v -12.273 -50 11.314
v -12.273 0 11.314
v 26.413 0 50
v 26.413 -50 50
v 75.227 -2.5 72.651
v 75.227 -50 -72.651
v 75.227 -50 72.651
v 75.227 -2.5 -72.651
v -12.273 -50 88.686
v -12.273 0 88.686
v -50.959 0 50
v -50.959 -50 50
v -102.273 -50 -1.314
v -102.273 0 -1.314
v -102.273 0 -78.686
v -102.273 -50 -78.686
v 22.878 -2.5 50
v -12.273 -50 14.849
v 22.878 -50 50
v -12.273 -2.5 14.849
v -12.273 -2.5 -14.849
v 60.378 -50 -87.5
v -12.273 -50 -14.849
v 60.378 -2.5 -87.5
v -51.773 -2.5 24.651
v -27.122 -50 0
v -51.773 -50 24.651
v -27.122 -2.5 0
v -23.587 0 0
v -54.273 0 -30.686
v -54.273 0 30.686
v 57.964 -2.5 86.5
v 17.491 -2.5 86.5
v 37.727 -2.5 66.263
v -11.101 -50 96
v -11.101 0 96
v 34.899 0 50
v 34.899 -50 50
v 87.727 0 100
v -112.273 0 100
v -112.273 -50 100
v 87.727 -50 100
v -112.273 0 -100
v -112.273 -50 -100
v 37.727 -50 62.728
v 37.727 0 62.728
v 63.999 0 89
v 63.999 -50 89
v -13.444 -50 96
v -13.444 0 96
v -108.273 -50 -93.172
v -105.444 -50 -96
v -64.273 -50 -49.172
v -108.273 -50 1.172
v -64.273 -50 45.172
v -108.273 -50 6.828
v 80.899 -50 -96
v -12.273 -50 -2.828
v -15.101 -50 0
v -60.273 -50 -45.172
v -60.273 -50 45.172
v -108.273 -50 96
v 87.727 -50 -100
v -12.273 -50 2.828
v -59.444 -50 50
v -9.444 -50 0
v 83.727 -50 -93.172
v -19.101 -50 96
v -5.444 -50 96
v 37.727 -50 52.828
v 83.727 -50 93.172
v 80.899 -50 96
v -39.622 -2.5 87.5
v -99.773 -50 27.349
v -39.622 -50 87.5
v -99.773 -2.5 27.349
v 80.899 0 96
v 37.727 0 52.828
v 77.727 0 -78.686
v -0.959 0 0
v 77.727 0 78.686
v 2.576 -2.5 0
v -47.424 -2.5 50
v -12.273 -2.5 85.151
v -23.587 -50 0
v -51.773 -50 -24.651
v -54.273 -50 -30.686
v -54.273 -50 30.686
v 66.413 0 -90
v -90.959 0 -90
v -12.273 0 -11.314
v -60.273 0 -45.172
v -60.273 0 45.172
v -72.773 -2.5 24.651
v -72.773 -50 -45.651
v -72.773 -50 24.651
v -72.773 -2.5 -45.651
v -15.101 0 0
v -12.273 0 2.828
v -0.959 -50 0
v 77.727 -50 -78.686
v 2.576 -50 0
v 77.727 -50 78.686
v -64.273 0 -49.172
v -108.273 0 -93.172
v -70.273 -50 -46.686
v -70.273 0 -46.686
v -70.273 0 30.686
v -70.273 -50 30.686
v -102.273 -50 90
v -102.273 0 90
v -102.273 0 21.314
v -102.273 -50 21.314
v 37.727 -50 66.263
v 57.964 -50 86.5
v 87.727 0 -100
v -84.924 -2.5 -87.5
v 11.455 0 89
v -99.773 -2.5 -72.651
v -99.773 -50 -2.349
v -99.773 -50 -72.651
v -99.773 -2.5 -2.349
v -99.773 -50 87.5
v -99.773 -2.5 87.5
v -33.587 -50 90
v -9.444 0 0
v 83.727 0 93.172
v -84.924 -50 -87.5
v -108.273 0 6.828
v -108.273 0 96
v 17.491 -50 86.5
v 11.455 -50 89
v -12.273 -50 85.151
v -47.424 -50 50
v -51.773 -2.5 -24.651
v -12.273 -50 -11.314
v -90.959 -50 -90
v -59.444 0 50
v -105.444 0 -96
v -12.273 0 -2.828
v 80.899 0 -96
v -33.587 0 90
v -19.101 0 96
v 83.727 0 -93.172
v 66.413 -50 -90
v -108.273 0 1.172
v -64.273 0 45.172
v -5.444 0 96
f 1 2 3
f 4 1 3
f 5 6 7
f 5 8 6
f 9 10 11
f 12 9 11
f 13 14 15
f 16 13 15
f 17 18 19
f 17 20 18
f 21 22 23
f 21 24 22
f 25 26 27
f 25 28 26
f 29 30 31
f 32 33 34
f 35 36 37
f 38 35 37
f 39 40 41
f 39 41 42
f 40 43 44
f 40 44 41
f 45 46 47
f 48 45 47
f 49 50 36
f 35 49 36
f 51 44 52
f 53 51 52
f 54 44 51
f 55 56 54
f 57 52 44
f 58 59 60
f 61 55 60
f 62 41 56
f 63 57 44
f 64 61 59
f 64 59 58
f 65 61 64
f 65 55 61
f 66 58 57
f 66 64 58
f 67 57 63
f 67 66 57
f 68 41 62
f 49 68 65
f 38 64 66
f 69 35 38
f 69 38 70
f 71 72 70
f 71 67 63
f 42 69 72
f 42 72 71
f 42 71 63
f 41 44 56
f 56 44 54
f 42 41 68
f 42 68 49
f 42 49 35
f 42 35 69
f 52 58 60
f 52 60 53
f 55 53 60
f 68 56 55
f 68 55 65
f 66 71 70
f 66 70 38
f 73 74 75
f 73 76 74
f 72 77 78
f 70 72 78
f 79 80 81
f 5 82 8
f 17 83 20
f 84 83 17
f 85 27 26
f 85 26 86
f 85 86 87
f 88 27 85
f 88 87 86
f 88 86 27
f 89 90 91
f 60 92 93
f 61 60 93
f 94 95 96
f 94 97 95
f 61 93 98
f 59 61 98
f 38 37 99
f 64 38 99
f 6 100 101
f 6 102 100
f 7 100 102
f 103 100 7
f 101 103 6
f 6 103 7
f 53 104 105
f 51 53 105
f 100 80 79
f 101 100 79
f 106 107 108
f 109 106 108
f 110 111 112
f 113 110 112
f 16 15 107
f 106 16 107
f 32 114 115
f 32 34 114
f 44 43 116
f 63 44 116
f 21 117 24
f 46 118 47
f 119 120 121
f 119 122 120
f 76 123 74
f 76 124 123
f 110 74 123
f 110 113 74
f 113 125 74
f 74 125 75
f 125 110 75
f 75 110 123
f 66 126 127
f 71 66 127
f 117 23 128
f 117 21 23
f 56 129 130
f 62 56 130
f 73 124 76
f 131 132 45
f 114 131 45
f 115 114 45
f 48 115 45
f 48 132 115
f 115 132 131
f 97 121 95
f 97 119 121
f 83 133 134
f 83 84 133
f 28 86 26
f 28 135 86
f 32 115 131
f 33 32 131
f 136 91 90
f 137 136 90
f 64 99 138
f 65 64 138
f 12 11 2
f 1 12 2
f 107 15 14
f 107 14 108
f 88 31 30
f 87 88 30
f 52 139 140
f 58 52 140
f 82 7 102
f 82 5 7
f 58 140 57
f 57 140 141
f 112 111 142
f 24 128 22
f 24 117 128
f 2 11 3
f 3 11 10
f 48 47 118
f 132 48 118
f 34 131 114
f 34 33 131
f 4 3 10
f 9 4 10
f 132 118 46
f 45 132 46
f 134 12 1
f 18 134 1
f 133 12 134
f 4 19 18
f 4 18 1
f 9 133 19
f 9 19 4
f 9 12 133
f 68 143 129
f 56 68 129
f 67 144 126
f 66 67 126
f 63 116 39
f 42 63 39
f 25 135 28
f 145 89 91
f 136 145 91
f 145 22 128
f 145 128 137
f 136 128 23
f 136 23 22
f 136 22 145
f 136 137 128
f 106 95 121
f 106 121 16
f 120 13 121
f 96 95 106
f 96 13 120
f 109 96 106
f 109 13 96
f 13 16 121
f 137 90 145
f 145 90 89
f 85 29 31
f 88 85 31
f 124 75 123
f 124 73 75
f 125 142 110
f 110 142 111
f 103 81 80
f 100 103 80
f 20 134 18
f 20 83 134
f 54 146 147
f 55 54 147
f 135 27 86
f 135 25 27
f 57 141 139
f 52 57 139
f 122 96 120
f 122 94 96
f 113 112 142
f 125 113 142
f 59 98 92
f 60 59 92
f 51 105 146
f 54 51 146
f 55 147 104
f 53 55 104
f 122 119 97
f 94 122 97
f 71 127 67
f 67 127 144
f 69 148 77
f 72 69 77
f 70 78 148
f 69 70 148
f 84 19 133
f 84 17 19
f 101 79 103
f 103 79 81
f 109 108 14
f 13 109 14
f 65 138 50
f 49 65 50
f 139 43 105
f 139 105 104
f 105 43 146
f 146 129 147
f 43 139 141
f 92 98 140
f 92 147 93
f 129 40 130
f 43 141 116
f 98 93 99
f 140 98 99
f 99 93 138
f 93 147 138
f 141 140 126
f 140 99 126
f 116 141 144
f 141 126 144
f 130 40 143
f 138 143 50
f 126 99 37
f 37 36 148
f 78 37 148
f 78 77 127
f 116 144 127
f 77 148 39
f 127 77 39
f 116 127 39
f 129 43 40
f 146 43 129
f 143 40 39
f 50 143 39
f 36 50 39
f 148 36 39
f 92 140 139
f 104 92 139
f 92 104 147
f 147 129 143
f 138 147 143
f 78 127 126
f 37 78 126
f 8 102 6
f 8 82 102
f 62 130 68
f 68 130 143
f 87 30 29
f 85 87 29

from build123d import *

# Parameters (mm, degrees)
F0_W     = 200
F0_H     = 200
F1_DEPTH = 50
F3_DEPTH = 50
F4_T     = -2.5
F4_2_T   = -2.5
F4_3_T   = -2.5
F4_4_T   = -2.5
F4_5_T   = -2.5
F4_6_T   = -2.5
F4_7_T   = -2.5


with BuildPart() as f1:
    # F0 (on Front) → F1 (new body)
    with BuildSketch(Plane.XZ):
        with Locations((-12.2728385031, 0)):
            Rectangle(F0_W, F0_H)
        Polygon((-64.2728385031, -49.1715728753), (-108.2728385031, -93.1715728753), (-108.2728385031, 1.1715728753), (-64.2728385031, 45.1715728753), align=None, mode=Mode.SUBTRACT)
        Polygon((-60.2728385031, -45.1715728753), (-60.2728385031, 45.1715728753), (-15.1012656279, 0), align=None, mode=Mode.SUBTRACT)
        Polygon((-12.2728385031, -2.8284271247), (80.8987343721, -96), (-105.4444113784, -96), align=None, mode=Mode.SUBTRACT)
        Polygon((-108.2728385031, 96), (-19.1012656279, 96), (-108.2728385031, 6.8284271247), align=None, mode=Mode.SUBTRACT)
        Polygon((83.7271614969, 93.1715728753), (83.7271614969, -93.1715728753), (-9.4444113784, 0), align=None, mode=Mode.SUBTRACT)
        Polygon((-59.4444113784, 50), (-13.4444113784, 96), (-11.1012656279, 96), (34.8987343721, 50), (-12.2728385031, 2.8284271247), align=None, mode=Mode.SUBTRACT)
        Polygon((-5.4444113784, 96), (80.8987343721, 96), (37.7271614969, 52.8284271247), align=None, mode=Mode.SUBTRACT)
    extrude(amount=F1_DEPTH)


with BuildPart() as f3:
    # F2 (on Front) → F3 (new body)
    with BuildSketch(Plane.XZ):
        Polygon((77.7271614969, -78.686291501), (77.7271614969, 78.686291501), (-0.9591300041, 0), align=None)
    extrude(amount=F3_DEPTH)

    # F4#7
    f4_7_openings = [f3.faces().sort_by_distance(p)[0] for p in [
        (51.498398, -50, 0),
    ]]
    offset(amount=F4_7_T, openings=f4_7_openings)


with BuildPart() as f3b:
    # F2 (on Front) → F3, piece 2 (new body)
    with BuildSketch(Plane.XZ):
        Polygon((-12.2728385031, -11.313708499), (-90.9591300041, -90), (66.4134529979, -90), align=None)
    extrude(amount=F3_DEPTH)

    # F4#3
    f4_3_openings = [f3b.faces().sort_by_distance(p)[0] for p in [
        (-12.272839, -50, -63.771236),
    ]]
    offset(amount=F4_3_T, openings=f4_3_openings)


with BuildPart() as f3c:
    # F2 (on Front) → F3, piece 3 (new body)
    with BuildSketch(Plane.XZ):
        Polygon((26.4134529979, 50), (-12.2728385031, 88.686291501), (-50.9591300041, 50), (-12.2728385031, 11.313708499), align=None)
    extrude(amount=F3_DEPTH)

    # F4#5
    f4_5_openings = [f3c.faces().sort_by_distance(p)[0] for p in [
        (-12.272839, -50, 50),
    ]]
    offset(amount=F4_5_T, openings=f4_5_openings)


with BuildPart() as f3d:
    # F2 (on Front) → F3, piece 4 (new body)
    with BuildSketch(Plane.XZ):
        Polygon((-23.5865470021, 0), (-54.2728385031, 30.686291501), (-54.2728385031, -30.686291501), align=None)
    extrude(amount=F3_DEPTH)

    # F4#4
    f4_4_openings = [f3d.faces().sort_by_distance(p)[0] for p in [
        (-44.044075, -50, 0),
    ]]
    offset(amount=F4_4_T, openings=f4_4_openings)


with BuildPart() as f3e:
    # F2 (on Front) → F3, piece 5 (new body)
    with BuildSketch(Plane.XZ):
        Polygon((-102.2728385031, -1.313708499), (-102.2728385031, -78.686291501), (-70.2728385031, -46.686291501), (-70.2728385031, 30.686291501), align=None)
    extrude(amount=F3_DEPTH)

    # F4
    f4_openings = [f3e.faces().sort_by_distance(p)[0] for p in [
        (-86.272839, -50, -24),
    ]]
    offset(amount=F4_T, openings=f4_openings)


with BuildPart() as f3f:
    # F2 (on Front) → F3, piece 6 (new body)
    with BuildSketch(Plane.XZ):
        Polygon((-102.2728385031, 90), (-102.2728385031, 21.313708499), (-33.5865470021, 90), align=None)
    extrude(amount=F3_DEPTH)

    # F4#2
    f4_2_openings = [f3f.faces().sort_by_distance(p)[0] for p in [
        (-79.377408, -50, 67.104569),
    ]]
    offset(amount=F4_2_T, openings=f4_2_openings)


with BuildPart() as f3g:
    # F2 (on Front) → F3, piece 7 (new body)
    with BuildSketch(Plane.XZ):
        Polygon((63.999237289, 88.9999991109), (11.4550857047, 88.9999991109), (37.7271614969, 62.7279233187), align=None)
    extrude(amount=F3_DEPTH)

    # F4#6
    f4_6_openings = [f3g.faces().sort_by_distance(p)[0] for p in [
        (37.727161, -50, 80.242641),
    ]]
    offset(amount=F4_6_T, openings=f4_6_openings)


solid = Compound([f1.part, f3.part, f3b.part, f3c.part, f3d.part, f3e.part, f3f.part, f3g.part])
